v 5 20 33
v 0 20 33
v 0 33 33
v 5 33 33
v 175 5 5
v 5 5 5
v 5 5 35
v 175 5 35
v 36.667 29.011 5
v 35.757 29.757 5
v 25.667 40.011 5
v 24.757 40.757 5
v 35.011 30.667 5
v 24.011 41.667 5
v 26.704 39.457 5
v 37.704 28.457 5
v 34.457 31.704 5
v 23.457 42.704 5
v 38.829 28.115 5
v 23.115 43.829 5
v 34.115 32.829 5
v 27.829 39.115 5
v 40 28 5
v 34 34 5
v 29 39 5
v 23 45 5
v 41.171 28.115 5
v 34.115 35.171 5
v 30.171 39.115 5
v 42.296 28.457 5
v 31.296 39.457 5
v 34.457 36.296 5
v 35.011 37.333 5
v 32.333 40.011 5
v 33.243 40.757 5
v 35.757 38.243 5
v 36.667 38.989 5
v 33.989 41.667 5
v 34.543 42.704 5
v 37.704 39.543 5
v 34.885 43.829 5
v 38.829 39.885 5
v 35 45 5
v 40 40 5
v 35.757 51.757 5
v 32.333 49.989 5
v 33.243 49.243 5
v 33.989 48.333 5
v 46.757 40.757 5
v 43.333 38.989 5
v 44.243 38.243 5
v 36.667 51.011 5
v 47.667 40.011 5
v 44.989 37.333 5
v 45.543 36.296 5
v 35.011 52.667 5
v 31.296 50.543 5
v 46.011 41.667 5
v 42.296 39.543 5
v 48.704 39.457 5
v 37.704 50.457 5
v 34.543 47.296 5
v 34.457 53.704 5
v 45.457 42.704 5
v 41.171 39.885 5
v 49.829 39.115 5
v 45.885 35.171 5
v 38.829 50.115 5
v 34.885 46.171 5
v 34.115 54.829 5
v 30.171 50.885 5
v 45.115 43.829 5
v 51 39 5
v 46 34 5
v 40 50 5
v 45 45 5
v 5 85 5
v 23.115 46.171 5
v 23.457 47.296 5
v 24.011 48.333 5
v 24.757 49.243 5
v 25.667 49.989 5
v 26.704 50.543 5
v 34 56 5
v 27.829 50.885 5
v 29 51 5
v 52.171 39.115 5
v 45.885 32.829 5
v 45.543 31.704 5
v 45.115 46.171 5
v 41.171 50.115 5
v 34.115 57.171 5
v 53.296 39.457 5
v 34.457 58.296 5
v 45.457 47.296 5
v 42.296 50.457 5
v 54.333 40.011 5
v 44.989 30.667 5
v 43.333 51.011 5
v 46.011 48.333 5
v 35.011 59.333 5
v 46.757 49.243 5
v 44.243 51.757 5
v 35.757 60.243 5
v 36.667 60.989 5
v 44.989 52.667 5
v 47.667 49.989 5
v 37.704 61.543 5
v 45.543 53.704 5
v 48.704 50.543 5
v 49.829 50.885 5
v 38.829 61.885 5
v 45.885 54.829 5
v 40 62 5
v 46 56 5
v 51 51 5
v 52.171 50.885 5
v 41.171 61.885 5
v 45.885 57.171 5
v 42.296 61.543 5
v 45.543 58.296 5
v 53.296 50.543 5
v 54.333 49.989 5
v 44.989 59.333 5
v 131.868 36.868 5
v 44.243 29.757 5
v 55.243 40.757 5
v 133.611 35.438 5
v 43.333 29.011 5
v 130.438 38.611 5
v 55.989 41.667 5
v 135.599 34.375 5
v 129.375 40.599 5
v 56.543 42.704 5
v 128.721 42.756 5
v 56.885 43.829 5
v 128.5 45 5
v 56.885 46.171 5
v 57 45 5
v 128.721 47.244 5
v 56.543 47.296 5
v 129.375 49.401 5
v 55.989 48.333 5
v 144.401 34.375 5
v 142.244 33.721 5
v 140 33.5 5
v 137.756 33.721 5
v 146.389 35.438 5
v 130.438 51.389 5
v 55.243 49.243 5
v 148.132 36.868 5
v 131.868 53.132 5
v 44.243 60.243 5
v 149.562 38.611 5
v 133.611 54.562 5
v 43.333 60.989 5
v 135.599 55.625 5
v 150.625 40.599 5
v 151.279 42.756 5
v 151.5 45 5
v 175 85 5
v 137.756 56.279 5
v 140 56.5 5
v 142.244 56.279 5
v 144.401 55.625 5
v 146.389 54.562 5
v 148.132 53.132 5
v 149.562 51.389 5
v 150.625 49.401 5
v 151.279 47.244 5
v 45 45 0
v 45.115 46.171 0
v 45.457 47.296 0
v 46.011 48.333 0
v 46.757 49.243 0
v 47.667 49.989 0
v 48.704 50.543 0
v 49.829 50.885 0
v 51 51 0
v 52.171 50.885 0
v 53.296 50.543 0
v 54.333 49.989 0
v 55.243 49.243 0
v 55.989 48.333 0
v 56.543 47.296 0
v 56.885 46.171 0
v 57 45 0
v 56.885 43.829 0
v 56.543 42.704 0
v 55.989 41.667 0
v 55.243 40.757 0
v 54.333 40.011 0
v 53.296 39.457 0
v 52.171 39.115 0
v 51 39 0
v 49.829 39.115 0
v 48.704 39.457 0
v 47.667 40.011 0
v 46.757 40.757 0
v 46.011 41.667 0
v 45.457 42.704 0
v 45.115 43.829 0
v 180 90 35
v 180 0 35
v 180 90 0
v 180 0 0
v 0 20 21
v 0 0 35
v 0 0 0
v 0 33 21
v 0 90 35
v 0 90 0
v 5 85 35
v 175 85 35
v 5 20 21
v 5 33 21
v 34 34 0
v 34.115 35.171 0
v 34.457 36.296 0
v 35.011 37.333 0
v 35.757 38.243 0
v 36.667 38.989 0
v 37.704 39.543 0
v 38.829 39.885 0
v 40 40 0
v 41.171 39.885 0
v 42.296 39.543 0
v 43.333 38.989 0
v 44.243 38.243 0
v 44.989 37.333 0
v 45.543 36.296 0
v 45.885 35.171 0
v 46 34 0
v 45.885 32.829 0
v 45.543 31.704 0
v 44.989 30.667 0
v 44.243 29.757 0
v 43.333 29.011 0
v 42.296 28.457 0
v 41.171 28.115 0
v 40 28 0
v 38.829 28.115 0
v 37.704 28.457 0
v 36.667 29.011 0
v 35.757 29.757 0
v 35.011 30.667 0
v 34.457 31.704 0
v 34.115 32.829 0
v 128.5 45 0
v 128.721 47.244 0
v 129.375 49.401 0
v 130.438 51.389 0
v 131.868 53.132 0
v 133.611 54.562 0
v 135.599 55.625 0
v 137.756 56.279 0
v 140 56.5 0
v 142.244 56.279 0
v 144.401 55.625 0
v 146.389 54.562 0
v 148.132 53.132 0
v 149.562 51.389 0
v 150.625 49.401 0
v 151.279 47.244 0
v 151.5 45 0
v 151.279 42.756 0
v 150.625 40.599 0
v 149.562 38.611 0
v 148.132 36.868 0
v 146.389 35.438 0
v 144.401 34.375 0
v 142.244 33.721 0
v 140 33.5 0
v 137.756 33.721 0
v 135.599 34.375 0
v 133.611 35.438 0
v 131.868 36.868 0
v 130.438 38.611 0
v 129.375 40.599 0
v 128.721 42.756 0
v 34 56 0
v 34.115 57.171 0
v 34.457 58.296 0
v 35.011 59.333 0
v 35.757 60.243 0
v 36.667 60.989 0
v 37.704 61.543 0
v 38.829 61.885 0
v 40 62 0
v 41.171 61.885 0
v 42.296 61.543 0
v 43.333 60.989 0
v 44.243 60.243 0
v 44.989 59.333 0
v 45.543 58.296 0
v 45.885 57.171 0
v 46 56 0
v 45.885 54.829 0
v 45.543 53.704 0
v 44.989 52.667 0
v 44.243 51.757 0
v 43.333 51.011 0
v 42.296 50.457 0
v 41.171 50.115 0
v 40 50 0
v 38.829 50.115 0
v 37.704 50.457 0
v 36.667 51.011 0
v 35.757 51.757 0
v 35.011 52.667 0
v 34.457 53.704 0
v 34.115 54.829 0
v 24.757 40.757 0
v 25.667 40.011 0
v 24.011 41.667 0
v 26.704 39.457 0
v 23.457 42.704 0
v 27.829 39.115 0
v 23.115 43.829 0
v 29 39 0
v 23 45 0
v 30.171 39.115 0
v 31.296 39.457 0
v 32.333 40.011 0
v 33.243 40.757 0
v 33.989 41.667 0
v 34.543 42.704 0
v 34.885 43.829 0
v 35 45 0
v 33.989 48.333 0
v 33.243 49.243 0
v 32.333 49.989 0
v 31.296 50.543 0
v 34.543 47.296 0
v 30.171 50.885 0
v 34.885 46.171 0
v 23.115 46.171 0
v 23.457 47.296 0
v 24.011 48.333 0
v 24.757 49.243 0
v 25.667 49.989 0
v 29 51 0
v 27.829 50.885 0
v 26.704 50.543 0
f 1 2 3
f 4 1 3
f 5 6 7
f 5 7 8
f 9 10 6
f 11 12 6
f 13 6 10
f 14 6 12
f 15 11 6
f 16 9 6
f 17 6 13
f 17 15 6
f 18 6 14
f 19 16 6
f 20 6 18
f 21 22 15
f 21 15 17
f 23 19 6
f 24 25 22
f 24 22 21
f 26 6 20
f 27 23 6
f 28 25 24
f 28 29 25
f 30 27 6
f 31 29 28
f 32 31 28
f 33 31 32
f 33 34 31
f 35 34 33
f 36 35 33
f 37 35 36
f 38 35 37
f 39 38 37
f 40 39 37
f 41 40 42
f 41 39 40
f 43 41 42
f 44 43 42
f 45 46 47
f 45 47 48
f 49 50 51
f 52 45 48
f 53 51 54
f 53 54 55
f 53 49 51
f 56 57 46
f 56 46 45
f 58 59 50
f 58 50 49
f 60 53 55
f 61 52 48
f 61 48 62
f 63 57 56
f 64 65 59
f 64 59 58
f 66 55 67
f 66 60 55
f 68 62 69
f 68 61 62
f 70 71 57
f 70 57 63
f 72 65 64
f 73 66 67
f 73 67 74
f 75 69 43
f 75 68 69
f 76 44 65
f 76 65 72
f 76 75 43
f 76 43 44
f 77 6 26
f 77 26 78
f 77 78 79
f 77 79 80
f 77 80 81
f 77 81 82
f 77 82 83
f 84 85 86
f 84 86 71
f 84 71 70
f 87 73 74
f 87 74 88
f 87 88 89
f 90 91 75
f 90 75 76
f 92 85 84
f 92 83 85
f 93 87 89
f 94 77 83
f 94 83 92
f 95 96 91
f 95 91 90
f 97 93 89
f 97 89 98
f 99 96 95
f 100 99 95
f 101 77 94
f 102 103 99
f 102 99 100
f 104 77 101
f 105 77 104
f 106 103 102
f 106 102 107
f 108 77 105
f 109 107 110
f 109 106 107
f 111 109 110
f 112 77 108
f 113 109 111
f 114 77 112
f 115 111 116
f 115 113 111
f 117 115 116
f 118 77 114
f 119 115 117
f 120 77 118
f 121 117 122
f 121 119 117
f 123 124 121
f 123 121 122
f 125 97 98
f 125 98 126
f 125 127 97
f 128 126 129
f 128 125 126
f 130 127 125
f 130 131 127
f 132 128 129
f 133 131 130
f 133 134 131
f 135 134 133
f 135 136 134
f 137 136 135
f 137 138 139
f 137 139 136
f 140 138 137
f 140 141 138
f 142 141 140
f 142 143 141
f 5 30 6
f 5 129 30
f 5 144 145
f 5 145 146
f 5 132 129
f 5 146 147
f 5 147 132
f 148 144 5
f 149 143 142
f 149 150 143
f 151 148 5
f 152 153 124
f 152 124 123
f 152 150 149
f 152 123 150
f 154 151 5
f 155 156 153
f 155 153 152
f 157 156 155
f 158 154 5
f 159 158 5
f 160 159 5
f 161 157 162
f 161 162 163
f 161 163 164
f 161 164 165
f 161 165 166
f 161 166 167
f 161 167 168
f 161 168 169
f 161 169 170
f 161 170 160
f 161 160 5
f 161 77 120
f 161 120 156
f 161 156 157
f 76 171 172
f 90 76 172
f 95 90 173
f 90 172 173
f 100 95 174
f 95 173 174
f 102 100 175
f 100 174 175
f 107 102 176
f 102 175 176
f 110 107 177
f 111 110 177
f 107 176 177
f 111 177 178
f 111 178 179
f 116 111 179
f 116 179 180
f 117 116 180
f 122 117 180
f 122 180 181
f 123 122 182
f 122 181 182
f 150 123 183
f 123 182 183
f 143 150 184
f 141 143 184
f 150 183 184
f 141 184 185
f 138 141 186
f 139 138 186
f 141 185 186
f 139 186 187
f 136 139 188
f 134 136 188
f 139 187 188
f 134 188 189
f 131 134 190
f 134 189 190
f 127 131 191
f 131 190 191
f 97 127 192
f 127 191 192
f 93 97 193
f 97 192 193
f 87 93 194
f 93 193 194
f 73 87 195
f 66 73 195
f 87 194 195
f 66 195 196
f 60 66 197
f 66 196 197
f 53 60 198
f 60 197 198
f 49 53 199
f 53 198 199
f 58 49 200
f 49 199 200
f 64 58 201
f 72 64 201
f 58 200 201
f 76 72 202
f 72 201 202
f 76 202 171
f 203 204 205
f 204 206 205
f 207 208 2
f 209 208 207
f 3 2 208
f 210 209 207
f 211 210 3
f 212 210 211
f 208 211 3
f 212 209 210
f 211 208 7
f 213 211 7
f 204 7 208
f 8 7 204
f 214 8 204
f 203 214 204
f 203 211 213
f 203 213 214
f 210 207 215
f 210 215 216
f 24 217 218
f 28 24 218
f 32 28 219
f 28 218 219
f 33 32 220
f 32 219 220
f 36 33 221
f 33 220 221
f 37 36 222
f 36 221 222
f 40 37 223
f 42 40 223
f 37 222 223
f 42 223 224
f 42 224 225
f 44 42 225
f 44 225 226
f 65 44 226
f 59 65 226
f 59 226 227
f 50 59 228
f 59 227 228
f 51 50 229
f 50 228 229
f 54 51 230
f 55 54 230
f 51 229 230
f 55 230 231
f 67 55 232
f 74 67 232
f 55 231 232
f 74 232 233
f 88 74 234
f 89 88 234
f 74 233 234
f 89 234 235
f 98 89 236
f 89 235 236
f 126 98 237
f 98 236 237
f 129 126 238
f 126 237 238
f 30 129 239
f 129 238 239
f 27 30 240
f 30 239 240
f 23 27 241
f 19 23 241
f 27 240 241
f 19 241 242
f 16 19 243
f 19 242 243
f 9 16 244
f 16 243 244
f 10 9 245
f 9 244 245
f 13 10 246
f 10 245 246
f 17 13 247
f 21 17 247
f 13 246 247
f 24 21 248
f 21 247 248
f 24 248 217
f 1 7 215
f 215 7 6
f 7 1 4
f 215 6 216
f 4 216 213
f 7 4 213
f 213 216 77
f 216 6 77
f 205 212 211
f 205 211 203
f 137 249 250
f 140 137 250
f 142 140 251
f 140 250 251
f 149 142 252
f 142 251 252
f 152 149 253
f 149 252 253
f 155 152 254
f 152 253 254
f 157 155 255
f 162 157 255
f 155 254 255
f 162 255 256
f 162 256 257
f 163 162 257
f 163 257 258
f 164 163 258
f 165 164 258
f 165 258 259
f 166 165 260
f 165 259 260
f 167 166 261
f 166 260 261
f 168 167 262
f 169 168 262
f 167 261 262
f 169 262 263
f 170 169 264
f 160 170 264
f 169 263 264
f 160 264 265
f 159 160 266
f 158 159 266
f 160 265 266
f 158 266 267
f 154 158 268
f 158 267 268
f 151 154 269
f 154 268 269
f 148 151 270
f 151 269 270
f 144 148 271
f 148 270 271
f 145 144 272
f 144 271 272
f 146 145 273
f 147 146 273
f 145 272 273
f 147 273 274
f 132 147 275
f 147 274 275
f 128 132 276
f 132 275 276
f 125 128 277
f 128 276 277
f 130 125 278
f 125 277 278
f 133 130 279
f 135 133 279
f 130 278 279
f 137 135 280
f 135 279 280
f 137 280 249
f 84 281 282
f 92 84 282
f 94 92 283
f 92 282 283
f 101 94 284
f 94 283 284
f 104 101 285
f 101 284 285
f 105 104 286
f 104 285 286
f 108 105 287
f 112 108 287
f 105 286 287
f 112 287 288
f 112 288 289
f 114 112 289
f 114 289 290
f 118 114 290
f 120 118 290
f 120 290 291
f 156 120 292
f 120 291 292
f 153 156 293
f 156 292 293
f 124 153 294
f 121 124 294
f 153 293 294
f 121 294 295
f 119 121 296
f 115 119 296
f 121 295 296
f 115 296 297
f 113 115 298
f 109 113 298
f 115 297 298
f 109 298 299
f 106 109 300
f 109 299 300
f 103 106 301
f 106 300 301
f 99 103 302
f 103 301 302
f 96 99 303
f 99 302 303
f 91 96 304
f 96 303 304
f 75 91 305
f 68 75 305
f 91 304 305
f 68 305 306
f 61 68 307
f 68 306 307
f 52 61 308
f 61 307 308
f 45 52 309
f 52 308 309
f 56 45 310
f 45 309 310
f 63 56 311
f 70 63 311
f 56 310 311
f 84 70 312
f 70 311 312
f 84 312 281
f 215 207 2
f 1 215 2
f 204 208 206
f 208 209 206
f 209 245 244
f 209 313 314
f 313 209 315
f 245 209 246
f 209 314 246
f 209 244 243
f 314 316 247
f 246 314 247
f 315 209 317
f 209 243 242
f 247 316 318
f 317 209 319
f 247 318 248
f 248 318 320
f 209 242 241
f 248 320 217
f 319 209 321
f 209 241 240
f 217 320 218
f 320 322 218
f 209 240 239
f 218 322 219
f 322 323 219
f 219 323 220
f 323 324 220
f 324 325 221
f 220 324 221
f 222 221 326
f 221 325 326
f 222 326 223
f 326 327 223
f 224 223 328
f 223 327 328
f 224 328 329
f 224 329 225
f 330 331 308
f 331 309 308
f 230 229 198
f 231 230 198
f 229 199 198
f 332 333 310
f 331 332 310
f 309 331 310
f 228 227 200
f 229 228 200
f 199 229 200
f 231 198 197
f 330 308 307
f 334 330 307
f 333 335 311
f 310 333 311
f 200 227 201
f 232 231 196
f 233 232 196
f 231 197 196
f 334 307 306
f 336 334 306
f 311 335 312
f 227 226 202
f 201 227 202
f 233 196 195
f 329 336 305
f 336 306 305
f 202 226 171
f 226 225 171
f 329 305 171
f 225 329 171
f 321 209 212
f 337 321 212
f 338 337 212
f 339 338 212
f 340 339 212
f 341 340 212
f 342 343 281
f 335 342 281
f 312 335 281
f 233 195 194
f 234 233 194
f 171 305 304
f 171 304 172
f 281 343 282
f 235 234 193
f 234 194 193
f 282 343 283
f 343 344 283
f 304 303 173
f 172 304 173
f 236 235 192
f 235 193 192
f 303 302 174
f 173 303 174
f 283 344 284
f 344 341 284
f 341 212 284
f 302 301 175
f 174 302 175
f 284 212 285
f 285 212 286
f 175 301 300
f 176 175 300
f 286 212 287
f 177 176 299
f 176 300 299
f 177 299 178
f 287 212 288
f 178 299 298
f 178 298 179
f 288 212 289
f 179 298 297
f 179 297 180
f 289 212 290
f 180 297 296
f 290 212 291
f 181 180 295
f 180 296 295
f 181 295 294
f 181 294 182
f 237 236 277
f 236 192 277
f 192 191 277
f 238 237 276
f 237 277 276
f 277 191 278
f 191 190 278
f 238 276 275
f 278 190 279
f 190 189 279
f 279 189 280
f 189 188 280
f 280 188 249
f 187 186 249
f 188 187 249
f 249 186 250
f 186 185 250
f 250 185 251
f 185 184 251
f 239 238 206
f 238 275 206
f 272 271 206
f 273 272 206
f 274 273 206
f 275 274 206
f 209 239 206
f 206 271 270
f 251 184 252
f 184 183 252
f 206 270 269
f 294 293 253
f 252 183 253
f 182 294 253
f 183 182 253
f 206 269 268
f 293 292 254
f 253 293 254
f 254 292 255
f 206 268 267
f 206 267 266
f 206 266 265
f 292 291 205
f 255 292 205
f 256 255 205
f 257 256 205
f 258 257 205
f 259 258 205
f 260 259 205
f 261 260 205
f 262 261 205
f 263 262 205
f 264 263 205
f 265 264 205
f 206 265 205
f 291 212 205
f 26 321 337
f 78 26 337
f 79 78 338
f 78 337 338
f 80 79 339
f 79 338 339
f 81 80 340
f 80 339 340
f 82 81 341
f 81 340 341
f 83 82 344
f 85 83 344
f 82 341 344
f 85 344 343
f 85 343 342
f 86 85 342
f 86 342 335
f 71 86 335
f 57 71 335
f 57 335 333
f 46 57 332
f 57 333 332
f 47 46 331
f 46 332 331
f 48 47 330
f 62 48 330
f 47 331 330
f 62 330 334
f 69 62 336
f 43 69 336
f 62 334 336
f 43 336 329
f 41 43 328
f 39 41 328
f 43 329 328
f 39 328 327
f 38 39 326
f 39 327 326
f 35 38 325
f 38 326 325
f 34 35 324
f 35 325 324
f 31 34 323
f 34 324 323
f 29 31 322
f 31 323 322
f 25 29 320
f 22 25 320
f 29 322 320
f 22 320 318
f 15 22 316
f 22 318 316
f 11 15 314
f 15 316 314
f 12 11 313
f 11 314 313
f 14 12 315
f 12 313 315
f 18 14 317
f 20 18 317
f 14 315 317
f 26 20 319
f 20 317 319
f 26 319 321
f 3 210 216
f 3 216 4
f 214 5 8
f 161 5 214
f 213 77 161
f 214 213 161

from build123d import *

# Parameters (mm, degrees)
ESQUISSE1_W             = 180
ESQUISSE1_H             = 90
BOSS_EXTRU_1_DEPTH      = 5
ESQUISSE2_W             = 180
ESQUISSE2_H             = 90
ESQUISSE2_W_2           = 170
ESQUISSE2_H_2           = 80
BOSS_EXTRU_2_DEPTH      = 30
ESQUISSE3_R             = 11.5
ESQUISSE3_R_2           = 6
ENL_V_MAT_EXTRU_1_DEPTH = 5
ESQUISSE4_W             = 12
ESQUISSE4_H             = 13
ENL_V_MAT_EXTRU_2_DEPTH = 5


with BuildPart() as part:
    # Esquisse1 → Boss.-Extru.1 (new body)
    with BuildSketch(Plane.XY):
        with Locations((90, 45)):
            Rectangle(ESQUISSE1_W, ESQUISSE1_H)
    extrude(amount=BOSS_EXTRU_1_DEPTH)

    # Esquisse2 → Boss.-Extru.2 (add)
    with BuildSketch(Plane.XY.offset(5)):
        with Locations((90, 45)):
            Rectangle(ESQUISSE2_W, ESQUISSE2_H)
        with Locations((90, 45)):
            Rectangle(ESQUISSE2_W_2, ESQUISSE2_H_2, mode=Mode.SUBTRACT)
    extrude(amount=BOSS_EXTRU_2_DEPTH)

    # Esquisse3 → Enlèv. mat.-Extru.1 (cut)
    with BuildSketch(Plane(origin=(0, 0, 0), x_dir=(-1, 0, 0), z_dir=(0, 0, -1))):
        with Locations((-140, 45)):
            Circle(ESQUISSE3_R)
        with Locations((-40, 56)):
            Circle(ESQUISSE3_R_2)
        with Locations((-40, 34)):
            Circle(ESQUISSE3_R_2)
        with Locations((-51, 45)):
            Circle(ESQUISSE3_R_2)
        with Locations((-29, 45)):
            Circle(ESQUISSE3_R_2)
    extrude(amount=-ENL_V_MAT_EXTRU_1_DEPTH, mode=Mode.SUBTRACT)

    # Esquisse4 → Enlèv. mat.-Extru.2 (cut)
    with BuildSketch(Plane.ZY):
        with Locations((27, 26.5)):
            Rectangle(ESQUISSE4_W, ESQUISSE4_H)
    extrude(amount=-ENL_V_MAT_EXTRU_2_DEPTH, mode=Mode.SUBTRACT)


solid = part.part
